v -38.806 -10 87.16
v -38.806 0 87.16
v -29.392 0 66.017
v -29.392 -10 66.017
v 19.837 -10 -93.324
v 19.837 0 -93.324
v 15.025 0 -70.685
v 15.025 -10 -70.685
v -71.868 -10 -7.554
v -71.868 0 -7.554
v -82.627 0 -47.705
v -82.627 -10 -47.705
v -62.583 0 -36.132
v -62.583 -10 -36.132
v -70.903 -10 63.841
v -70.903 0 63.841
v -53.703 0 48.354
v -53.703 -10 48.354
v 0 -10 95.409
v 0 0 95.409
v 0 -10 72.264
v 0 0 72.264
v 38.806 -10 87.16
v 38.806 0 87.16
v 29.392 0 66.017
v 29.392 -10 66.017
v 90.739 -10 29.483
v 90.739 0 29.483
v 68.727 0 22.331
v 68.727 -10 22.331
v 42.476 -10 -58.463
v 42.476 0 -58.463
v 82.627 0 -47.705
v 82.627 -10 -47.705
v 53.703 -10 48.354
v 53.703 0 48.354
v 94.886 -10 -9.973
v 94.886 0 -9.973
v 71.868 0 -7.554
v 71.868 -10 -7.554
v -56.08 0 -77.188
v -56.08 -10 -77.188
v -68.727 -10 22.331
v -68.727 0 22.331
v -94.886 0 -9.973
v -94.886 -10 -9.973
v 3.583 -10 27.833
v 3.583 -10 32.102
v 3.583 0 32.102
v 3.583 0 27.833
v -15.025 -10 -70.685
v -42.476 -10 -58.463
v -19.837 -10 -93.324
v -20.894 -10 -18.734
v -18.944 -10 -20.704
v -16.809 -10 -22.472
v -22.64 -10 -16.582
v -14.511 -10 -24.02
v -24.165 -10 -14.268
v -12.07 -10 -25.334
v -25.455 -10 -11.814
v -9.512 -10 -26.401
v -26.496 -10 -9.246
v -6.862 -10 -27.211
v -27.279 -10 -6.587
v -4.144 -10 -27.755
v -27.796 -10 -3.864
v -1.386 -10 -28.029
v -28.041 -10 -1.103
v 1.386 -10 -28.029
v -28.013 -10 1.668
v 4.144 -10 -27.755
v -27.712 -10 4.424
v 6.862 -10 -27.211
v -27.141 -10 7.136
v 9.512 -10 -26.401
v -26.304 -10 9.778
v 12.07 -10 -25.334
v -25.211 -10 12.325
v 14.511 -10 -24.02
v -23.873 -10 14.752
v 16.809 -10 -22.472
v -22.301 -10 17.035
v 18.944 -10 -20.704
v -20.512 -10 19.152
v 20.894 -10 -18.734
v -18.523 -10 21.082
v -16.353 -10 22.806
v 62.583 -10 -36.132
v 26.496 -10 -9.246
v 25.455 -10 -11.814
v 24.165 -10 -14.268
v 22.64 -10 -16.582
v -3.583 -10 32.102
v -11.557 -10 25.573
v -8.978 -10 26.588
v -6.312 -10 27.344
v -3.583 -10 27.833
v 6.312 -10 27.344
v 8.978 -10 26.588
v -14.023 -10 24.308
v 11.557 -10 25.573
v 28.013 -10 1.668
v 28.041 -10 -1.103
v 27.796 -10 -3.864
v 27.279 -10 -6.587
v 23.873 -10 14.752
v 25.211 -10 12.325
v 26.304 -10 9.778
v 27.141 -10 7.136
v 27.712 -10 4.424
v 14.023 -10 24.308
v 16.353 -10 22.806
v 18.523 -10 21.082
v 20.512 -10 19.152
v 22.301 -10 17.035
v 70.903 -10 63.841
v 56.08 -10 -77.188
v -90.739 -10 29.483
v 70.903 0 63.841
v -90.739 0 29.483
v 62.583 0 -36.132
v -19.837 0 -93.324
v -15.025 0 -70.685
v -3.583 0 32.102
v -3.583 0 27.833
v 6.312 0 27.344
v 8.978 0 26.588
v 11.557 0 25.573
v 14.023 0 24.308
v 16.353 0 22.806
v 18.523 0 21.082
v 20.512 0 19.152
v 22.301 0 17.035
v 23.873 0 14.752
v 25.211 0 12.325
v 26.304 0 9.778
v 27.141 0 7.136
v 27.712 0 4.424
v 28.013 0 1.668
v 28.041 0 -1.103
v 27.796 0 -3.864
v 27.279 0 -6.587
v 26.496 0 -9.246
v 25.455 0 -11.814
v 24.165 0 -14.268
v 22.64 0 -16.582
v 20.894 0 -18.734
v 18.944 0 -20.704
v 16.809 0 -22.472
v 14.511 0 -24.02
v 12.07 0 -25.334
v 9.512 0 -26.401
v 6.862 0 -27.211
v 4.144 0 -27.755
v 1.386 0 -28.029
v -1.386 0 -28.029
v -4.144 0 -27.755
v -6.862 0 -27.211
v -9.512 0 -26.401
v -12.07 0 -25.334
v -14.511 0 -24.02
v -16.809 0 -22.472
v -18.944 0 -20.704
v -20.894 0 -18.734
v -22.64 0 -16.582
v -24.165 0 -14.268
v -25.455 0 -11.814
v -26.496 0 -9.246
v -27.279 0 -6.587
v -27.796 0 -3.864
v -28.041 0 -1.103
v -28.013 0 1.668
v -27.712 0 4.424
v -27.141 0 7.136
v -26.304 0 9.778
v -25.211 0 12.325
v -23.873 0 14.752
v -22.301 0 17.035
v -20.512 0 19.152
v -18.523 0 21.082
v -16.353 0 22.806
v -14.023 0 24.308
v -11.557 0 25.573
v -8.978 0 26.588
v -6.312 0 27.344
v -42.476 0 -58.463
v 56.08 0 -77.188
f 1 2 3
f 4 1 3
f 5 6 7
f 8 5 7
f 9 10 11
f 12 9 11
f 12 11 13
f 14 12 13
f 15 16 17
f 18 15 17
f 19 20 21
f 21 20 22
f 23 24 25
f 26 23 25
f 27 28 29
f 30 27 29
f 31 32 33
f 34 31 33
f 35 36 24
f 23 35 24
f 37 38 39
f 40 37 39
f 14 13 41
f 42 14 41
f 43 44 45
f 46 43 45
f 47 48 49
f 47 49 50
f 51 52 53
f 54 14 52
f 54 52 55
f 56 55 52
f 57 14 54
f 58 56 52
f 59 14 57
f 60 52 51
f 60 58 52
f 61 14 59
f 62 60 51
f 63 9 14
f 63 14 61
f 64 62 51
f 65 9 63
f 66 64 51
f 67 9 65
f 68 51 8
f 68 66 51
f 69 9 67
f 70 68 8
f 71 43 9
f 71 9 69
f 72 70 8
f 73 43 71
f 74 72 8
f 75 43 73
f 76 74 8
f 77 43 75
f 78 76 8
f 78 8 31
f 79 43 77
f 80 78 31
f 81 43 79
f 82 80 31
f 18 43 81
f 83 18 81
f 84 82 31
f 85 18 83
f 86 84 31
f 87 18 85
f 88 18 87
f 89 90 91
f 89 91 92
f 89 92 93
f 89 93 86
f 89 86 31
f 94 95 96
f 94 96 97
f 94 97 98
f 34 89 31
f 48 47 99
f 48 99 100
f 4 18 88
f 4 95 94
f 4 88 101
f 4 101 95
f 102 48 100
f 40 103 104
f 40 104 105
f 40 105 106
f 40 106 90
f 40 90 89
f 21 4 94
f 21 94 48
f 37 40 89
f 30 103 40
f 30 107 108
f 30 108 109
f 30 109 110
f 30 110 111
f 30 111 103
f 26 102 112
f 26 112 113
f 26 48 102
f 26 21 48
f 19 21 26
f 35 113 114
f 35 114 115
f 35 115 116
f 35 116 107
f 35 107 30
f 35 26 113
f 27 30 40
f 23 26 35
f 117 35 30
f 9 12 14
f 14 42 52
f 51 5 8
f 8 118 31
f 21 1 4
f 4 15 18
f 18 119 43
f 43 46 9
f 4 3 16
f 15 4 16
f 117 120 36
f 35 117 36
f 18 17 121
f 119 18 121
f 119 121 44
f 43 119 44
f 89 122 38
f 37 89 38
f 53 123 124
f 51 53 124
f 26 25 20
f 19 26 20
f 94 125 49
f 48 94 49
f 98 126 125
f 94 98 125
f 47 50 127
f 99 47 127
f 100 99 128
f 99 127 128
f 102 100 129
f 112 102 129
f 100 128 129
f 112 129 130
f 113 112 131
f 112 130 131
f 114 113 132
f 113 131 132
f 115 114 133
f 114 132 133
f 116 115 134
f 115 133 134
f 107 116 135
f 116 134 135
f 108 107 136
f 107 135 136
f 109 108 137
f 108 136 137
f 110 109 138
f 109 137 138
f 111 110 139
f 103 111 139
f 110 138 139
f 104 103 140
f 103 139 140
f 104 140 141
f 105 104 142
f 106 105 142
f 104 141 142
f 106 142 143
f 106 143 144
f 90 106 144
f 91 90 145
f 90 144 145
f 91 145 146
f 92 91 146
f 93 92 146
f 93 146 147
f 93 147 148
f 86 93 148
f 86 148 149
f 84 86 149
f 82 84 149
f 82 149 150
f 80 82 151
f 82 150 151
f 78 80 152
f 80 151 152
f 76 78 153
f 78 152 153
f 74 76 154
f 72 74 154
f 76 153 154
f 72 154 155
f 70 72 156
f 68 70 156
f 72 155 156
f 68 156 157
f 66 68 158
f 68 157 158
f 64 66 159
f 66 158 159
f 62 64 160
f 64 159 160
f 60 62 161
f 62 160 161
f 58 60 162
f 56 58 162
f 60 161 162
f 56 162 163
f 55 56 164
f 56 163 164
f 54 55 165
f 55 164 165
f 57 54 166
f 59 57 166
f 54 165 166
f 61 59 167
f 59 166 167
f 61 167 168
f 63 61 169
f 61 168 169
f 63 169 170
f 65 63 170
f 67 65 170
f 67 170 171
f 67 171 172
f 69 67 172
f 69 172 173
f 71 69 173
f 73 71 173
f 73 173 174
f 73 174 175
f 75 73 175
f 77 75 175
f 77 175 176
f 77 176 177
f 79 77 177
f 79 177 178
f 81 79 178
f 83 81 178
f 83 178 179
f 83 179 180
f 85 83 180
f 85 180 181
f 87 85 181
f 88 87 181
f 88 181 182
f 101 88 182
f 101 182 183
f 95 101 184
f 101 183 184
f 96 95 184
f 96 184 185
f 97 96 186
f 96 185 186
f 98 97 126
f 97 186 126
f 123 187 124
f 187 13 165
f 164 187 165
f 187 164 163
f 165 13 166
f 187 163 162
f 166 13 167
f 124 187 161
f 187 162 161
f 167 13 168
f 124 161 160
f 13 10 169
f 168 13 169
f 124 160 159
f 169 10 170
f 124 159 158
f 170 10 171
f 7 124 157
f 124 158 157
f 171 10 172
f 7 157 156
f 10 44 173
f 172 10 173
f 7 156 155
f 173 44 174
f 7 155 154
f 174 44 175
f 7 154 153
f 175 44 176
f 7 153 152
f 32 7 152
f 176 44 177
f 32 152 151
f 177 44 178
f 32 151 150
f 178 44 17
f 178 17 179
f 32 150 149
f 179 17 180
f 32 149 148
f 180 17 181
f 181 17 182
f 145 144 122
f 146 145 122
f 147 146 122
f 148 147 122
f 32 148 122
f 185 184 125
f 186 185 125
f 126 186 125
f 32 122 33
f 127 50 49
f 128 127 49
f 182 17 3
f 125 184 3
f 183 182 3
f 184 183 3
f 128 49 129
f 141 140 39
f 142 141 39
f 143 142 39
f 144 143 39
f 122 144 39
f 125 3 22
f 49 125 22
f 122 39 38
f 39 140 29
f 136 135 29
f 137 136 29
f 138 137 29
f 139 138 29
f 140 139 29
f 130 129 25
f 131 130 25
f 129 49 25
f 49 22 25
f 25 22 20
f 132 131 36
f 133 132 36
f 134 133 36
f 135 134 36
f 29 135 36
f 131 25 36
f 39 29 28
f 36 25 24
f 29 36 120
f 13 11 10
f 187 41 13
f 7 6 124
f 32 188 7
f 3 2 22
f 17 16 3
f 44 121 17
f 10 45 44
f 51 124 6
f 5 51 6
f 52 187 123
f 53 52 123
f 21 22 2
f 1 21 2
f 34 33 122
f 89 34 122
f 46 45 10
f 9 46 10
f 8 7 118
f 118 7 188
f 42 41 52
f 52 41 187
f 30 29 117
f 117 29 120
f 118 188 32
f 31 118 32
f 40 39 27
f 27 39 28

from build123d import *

# Parameters (mm, degrees)
F1_DEPTH = 10


with BuildPart() as f1:
    # F0 (on Front) → F1 (new body)
    with BuildSketch(Plane.XZ):
        with BuildLine():
            ThreePointArc((68.7216376731, 22.2237625256), (71.3443445379, 11.2491603119), (72.2257509845, 0))
            ThreePointArc((72.2257509845, 0), (72.1267681029, -3.7800037431), (71.8300907635, -7.5496467588))
            Line((71.8300907635, -7.5496467588), (71.8682359795, -7.5536559825))
            Line((71.8682359795, -7.5536559825), (90.7393569571, 29.4830042989))
            Line((90.7393569571, 29.4830042989), (68.7272492051, 22.3308369347))
            Line((68.7272492051, 22.3308369347), (68.7216376731, 22.2237625256))
        make_face()
        with BuildLine():
            ThreePointArc((68.6907711181, 22.3189844857), (68.706220892, 22.271378853), (68.7216376731, 22.2237625256))
            Line((68.7216376731, 22.2237625256), (68.7272492051, 22.3308369347))
            Line((68.7272492051, 22.3308369347), (68.6907711181, 22.3189844857))
        make_face()
        with BuildLine():
            Line((71.8682359795, -7.5536559825), (71.8300907635, -7.5496467588))
            ThreePointArc((71.8300907635, -7.5496467588), (71.824841879, -7.5994206574), (71.8195585042, -7.6491909069))
            Line((71.8195585042, -7.6491909069), (71.8682359795, -7.5536559825))
        make_face()
        with BuildLine():
            ThreePointArc((53.7411213719, 48.2540255208), (62.5743450868, 36.0695223455), (68.6907711181, 22.3189844857))
            Line((68.6907711181, 22.3189844857), (68.7272492051, 22.3308369347))
            Line((68.7272492051, 22.3308369347), (70.9027091813, 63.8410860985))
            Line((70.9027091813, 63.8410860985), (53.7026966757, 48.3541252765))
            Line((53.7026966757, 48.3541252765), (53.7411213719, 48.2540255208))
        make_face()
        with BuildLine():
            Line((71.8682359795, -7.5536559825), (71.8195585042, -7.6491909069))
            ThreePointArc((71.8195585042, -7.6491909069), (68.6752883589, -22.3665794008), (62.54933516, -36.1128754922))
            Line((62.54933516, -36.1128754922), (62.5825518506, -36.1320531575))
            Line((62.5825518506, -36.1320531575), (94.8863455739, -9.9729567887))
            Line((94.8863455739, -9.9729567887), (71.8682359795, -7.5536559825))
        make_face()
        with BuildLine():
            ThreePointArc((53.6741931103, 48.328460551), (53.7076701363, 48.2912546306), (53.7411213719, 48.2540255208))
            Line((53.7411213719, 48.2540255208), (53.7026966757, 48.3541252765))
            Line((53.7026966757, 48.3541252765), (53.6741931103, 48.328460551))
        make_face()
        with BuildLine():
            Line((62.5825518506, -36.1320531575), (62.54933516, -36.1128754922))
            ThreePointArc((62.54933516, -36.1128754922), (62.5242951969, -36.1562112976), (62.4992252097, -36.1995297408))
            Line((62.4992252097, -36.1995297408), (62.5825518506, -36.1320531575))
        make_face()
        with BuildLine():
            ThreePointArc((29.4682769627, 65.9407291294), (42.4937122829, 58.4024273613), (53.6741931103, 48.328460551))
            Line((53.6741931103, 48.328460551), (53.7026966757, 48.3541252765))
            Line((53.7026966757, 48.3541252765), (38.8063388571, 87.1604641336))
            Line((38.8063388571, 87.1604641336), (29.3924600174, 66.0165460747))
            Line((29.3924600174, 66.0165460747), (29.4682769627, 65.9407291294))
        make_face()
        with BuildLine():
            Line((62.5825518506, -36.1320531575), (62.4992252097, -36.1995297408))
            ThreePointArc((62.4992252097, -36.1995297408), (53.64069031, -48.365643264), (42.4532312644, -58.4318599779))
            Line((42.4532312644, -58.4318599779), (42.4757759621, -58.4628900922))
            Line((42.4757759621, -58.4628900922), (82.6266230256, -47.7045030461))
            Line((82.6266230256, -47.7045030461), (62.5825518506, -36.1320531575))
        make_face()
        with BuildLine():
            ThreePointArc((29.3768594991, 65.9815067367), (29.4225752952, 65.9611337703), (29.4682769627, 65.9407291294))
            Line((29.4682769627, 65.9407291294), (29.3924600174, 66.0165460747))
            Line((29.3924600174, 66.0165460747), (29.3768594991, 65.9815067367))
        make_face()
        with BuildLine():
            Line((42.4757759621, -58.4628900922), (42.4532312644, -58.4318599779))
            ThreePointArc((42.4532312644, -58.4318599779), (42.4127298599, -58.4612645356), (42.3722080888, -58.4906410201))
            Line((42.3722080888, -58.4906410201), (42.4757759621, -58.4628900922))
        make_face()
        with BuildLine():
            ThreePointArc((0.1000997557, 72.2256816189), (15.065530582, 70.637022117), (29.3768594991, 65.9815067367))
            Line((29.3768594991, 65.9815067367), (29.3924600174, 66.0165460747))
            Line((29.3924600174, 66.0165460747), (0, 95.4090060921))
            Line((0, 95.4090060921), (0, 72.264106315))
            Line((0, 72.264106315), (0.1000997557, 72.2256816189))
        make_face()
        with BuildLine():
            Line((42.4757759621, -58.4628900922), (42.3722080888, -58.4906410201))
            ThreePointArc((42.3722080888, -58.4906410201), (29.3311295961, -66.0018480187), (15.0165780078, -70.6474450367))
            Line((15.0165780078, -70.6474450367), (15.0245525294, -70.6849622112))
            Line((15.0245525294, -70.6849622112), (56.0800067168, -77.1875073449))
            Line((56.0800067168, -77.1875073449), (42.4757759621, -58.4628900922))
        make_face()
        with BuildLine():
            ThreePointArc((0, 72.2257509845), (0.0500498899, 72.2257336431), (0.1000997557, 72.2256816189))
            Line((0.1000997557, 72.2256816189), (0, 72.264106315))
            Line((0, 72.264106315), (0, 72.2257509845))
        make_face()
        with BuildLine():
            Line((15.0245525294, -70.6849622112), (15.0165780078, -70.6474450367))
            ThreePointArc((15.0165780078, -70.6474450367), (14.9676182226, -70.6578340314), (14.91865125, -70.6681890963))
            Line((14.91865125, -70.6681890963), (15.0245525294, -70.6849622112))
        make_face()
        with BuildLine():
            ThreePointArc((-29.2853856084, 66.0221576067), (-14.9676182226, 70.6578340314), (0, 72.2257509845))
            Line((0, 72.2257509845), (0, 72.264106315))
            Line((0, 72.264106315), (-38.8063388571, 87.1604641336))
            Line((-38.8063388571, 87.1604641336), (-29.3924600174, 66.0165460747))
            Line((-29.3924600174, 66.0165460747), (-29.2853856084, 66.0221576067))
        make_face()
        with BuildLine():
            Line((15.0245525294, -70.6849622112), (14.91865125, -70.6681890963))
            ThreePointArc((14.91865125, -70.6681890963), (-0.0500498899, -72.2257336431), (-15.0165780078, -70.6474450367))
            Line((-15.0165780078, -70.6474450367), (-15.0245525294, -70.6849622112))
            Line((-15.0245525294, -70.6849622112), (19.8366477759, -93.3240903974))
            Line((19.8366477759, -93.3240903974), (15.0245525294, -70.6849622112))
        make_face()
        with BuildLine():
            ThreePointArc((-29.3768594991, 65.9815067367), (-29.3311295961, 66.0018480187), (-29.2853856084, 66.0221576067))
            Line((-29.2853856084, 66.0221576067), (-29.3924600174, 66.0165460747))
            Line((-29.3924600174, 66.0165460747), (-29.3768594991, 65.9815067367))
        make_face()
        with BuildLine():
            Line((-15.0245525294, -70.6849622112), (-15.0165780078, -70.6474450367))
            ThreePointArc((-15.0165780078, -70.6474450367), (-15.065530582, -70.637022117), (-15.1144759217, -70.6265652774))
            Line((-15.1144759217, -70.6265652774), (-15.0245525294, -70.6849622112))
        make_face()
        with BuildLine():
            ThreePointArc((-53.6071617514, 48.4028027518), (-42.4127298599, 58.4612645356), (-29.3768594991, 65.9815067367))
            Line((-29.3768594991, 65.9815067367), (-29.3924600174, 66.0165460747))
            Line((-29.3924600174, 66.0165460747), (-70.9027091813, 63.8410860985))
            Line((-70.9027091813, 63.8410860985), (-53.7026966757, 48.3541252765))
            Line((-53.7026966757, 48.3541252765), (-53.6071617514, 48.4028027518))
        make_face()
        with BuildLine():
            Line((-15.0245525294, -70.6849622112), (-15.1144759217, -70.6265652774))
            ThreePointArc((-15.1144759217, -70.6265652774), (-29.4225752952, -65.9611337703), (-42.4532312644, -58.4318599779))
            Line((-42.4532312644, -58.4318599779), (-42.4757759621, -58.4628900922))
            Line((-42.4757759621, -58.4628900922), (-19.8366477759, -93.3240903974))
            Line((-19.8366477759, -93.3240903974), (-15.0245525294, -70.6849622112))
        make_face()
        with BuildLine():
            ThreePointArc((-53.6741931103, 48.328460551), (-53.64069031, 48.365643264), (-53.6071617514, 48.4028027518))
            Line((-53.6071617514, 48.4028027518), (-53.7026966757, 48.3541252765))
            Line((-53.7026966757, 48.3541252765), (-53.6741931103, 48.328460551))
        make_face()
        with BuildLine():
            Line((-42.4757759621, -58.4628900922), (-42.4532312644, -58.4318599779))
            ThreePointArc((-42.4532312644, -58.4318599779), (-42.4937122829, -58.4024273613), (-42.5341728958, -58.3729666998))
            Line((-42.5341728958, -58.3729666998), (-42.4757759621, -58.4628900922))
        make_face()
        with BuildLine():
            ThreePointArc((-68.6597726218, 22.4141635755), (-62.5242951969, 36.1562112976), (-53.6741931103, 48.328460551))
            Line((-53.6741931103, 48.328460551), (-53.7026966757, 48.3541252765))
            Line((-53.7026966757, 48.3541252765), (-90.7393569571, 29.4830042989))
            Line((-90.7393569571, 29.4830042989), (-68.7272492051, 22.3308369347))
            Line((-68.7272492051, 22.3308369347), (-68.6597726218, 22.4141635755))
        make_face()
        with BuildLine():
            Line((-42.4757759621, -58.4628900922), (-42.5341728958, -58.3729666998))
            ThreePointArc((-42.5341728958, -58.3729666998), (-53.7076701363, -48.2912546306), (-62.54933516, -36.1128754922))
            Line((-62.54933516, -36.1128754922), (-62.5825518506, -36.1320531575))
            Line((-62.5825518506, -36.1320531575), (-56.0800067168, -77.1875073449))
            Line((-56.0800067168, -77.1875073449), (-42.4757759621, -58.4628900922))
        make_face()
        with BuildLine():
            ThreePointArc((-68.6907711181, 22.3189844857), (-68.6752883589, 22.3665794008), (-68.6597726218, 22.4141635755))
            Line((-68.6597726218, 22.4141635755), (-68.7272492051, 22.3308369347))
            Line((-68.7272492051, 22.3308369347), (-68.6907711181, 22.3189844857))
        make_face()
        with BuildLine():
            Line((-62.5825518506, -36.1320531575), (-62.54933516, -36.1128754922))
            ThreePointArc((-62.54933516, -36.1128754922), (-62.5743450868, -36.0695223455), (-62.5993249654, -36.0261518781))
            Line((-62.5993249654, -36.0261518781), (-62.5825518506, -36.1320531575))
        make_face()
        with BuildLine():
            ThreePointArc((-71.8404850515, -7.4500881093), (-71.824841879, 7.5994206574), (-68.6907711181, 22.3189844857))
            Line((-68.6907711181, 22.3189844857), (-68.7272492051, 22.3308369347))
            Line((-68.7272492051, 22.3308369347), (-94.8863455739, -9.9729567887))
            Line((-94.8863455739, -9.9729567887), (-71.8682359795, -7.5536559825))
            Line((-71.8682359795, -7.5536559825), (-71.8404850515, -7.4500881093))
        make_face()
        with BuildLine():
            Line((-62.5825518506, -36.1320531575), (-62.5993249654, -36.0261518781))
            ThreePointArc((-62.5993249654, -36.0261518781), (-68.706220892, -22.271378853), (-71.8300907635, -7.5496467588))
            Line((-71.8300907635, -7.5496467588), (-71.8682359795, -7.5536559825))
            Line((-71.8682359795, -7.5536559825), (-82.6266230256, -47.7045030461))
            Line((-82.6266230256, -47.7045030461), (-62.5825518506, -36.1320531575))
        make_face()
        with BuildLine():
            ThreePointArc((-71.8300907635, -7.5496467588), (-71.8353051551, -7.4998692348), (-71.8404850515, -7.4500881093))
            Line((-71.8404850515, -7.4500881093), (-71.8682359795, -7.5536559825))
            Line((-71.8682359795, -7.5536559825), (-71.8300907635, -7.5496467588))
        make_face()
        with BuildLine():
            ThreePointArc((71.8300907635, -7.5496467588), (72.1267681029, -3.7800037431), (72.2257509845, 0))
            ThreePointArc((72.2257509845, 0), (71.3443445379, 11.2491603119), (68.7216376731, 22.2237625256))
            ThreePointArc((68.7216376731, 22.2237625256), (68.706220892, 22.271378853), (68.6907711181, 22.3189844857))
            ThreePointArc((68.6907711181, 22.3189844857), (62.5743450868, 36.0695223455), (53.7411213719, 48.2540255208))
            ThreePointArc((53.7411213719, 48.2540255208), (53.7076701363, 48.2912546306), (53.6741931103, 48.328460551))
            ThreePointArc((53.6741931103, 48.328460551), (42.4937122829, 58.4024273613), (29.4682769627, 65.9407291294))
            ThreePointArc((29.4682769627, 65.9407291294), (29.4225752952, 65.9611337703), (29.3768594991, 65.9815067367))
            ThreePointArc((29.3768594991, 65.9815067367), (15.065530582, 70.637022117), (0.1000997557, 72.2256816189))
            ThreePointArc((0.1000997557, 72.2256816189), (0.0500498899, 72.2257336431), (0, 72.2257509845))
            ThreePointArc((0, 72.2257509845), (-14.9676182226, 70.6578340314), (-29.2853856084, 66.0221576067))
            ThreePointArc((-29.2853856084, 66.0221576067), (-29.3311295961, 66.0018480187), (-29.3768594991, 65.9815067367))
            ThreePointArc((-29.3768594991, 65.9815067367), (-42.4127298599, 58.4612645356), (-53.6071617514, 48.4028027518))
            ThreePointArc((-53.6071617514, 48.4028027518), (-53.64069031, 48.365643264), (-53.6741931103, 48.328460551))
            ThreePointArc((-53.6741931103, 48.328460551), (-62.5242951969, 36.1562112976), (-68.6597726218, 22.4141635755))
            ThreePointArc((-68.6597726218, 22.4141635755), (-68.6752883589, 22.3665794008), (-68.6907711181, 22.3189844857))
            ThreePointArc((-68.6907711181, 22.3189844857), (-71.824841879, 7.5994206574), (-71.8404850515, -7.4500881093))
            ThreePointArc((-71.8404850515, -7.4500881093), (-71.8353051551, -7.4998692348), (-71.8300907635, -7.5496467588))
            ThreePointArc((-71.8300907635, -7.5496467588), (-68.706220892, -22.271378853), (-62.5993249654, -36.0261518781))
            ThreePointArc((-62.5993249654, -36.0261518781), (-62.5743450868, -36.0695223455), (-62.54933516, -36.1128754922))
            ThreePointArc((-62.54933516, -36.1128754922), (-53.7076701363, -48.2912546306), (-42.5341728958, -58.3729666998))
            ThreePointArc((-42.5341728958, -58.3729666998), (-42.4937122829, -58.4024273613), (-42.4532312644, -58.4318599779))
            ThreePointArc((-42.4532312644, -58.4318599779), (-29.4225752952, -65.9611337703), (-15.1144759217, -70.6265652774))
            ThreePointArc((-15.1144759217, -70.6265652774), (-15.065530582, -70.637022117), (-15.0165780078, -70.6474450367))
            ThreePointArc((-15.0165780078, -70.6474450367), (-0.0500498899, -72.2257336431), (14.91865125, -70.6681890963))
            ThreePointArc((14.91865125, -70.6681890963), (14.9676182226, -70.6578340314), (15.0165780078, -70.6474450367))
            ThreePointArc((15.0165780078, -70.6474450367), (29.3311295961, -66.0018480187), (42.3722080888, -58.4906410201))
            ThreePointArc((42.3722080888, -58.4906410201), (42.4127298599, -58.4612645356), (42.4532312644, -58.4318599779))
            ThreePointArc((42.4532312644, -58.4318599779), (53.64069031, -48.365643264), (62.4992252097, -36.1995297408))
            ThreePointArc((62.4992252097, -36.1995297408), (62.5242951969, -36.1562112976), (62.54933516, -36.1128754922))
            ThreePointArc((62.54933516, -36.1128754922), (68.6752883589, -22.3665794008), (71.8195585042, -7.6491909069))
            ThreePointArc((71.8195585042, -7.6491909069), (71.824841879, -7.5994206574), (71.8300907635, -7.5496467588))
        make_face()
        with BuildLine():
            ThreePointArc((3.5834573209, 27.8331144006), (0, -28.0628477458), (-3.5834573209, 27.8331144006))
            Line((-3.5834573209, 27.8331144006), (-3.5834573209, 32.1017801762))
            Line((-3.5834573209, 32.1017801762), (3.5834573209, 32.1017801762))
            Line((3.5834573209, 32.1017801762), (3.5834573209, 27.8331144006))
        make_face(mode=Mode.SUBTRACT)
    extrude(amount=F1_DEPTH)


solid = f1.part
